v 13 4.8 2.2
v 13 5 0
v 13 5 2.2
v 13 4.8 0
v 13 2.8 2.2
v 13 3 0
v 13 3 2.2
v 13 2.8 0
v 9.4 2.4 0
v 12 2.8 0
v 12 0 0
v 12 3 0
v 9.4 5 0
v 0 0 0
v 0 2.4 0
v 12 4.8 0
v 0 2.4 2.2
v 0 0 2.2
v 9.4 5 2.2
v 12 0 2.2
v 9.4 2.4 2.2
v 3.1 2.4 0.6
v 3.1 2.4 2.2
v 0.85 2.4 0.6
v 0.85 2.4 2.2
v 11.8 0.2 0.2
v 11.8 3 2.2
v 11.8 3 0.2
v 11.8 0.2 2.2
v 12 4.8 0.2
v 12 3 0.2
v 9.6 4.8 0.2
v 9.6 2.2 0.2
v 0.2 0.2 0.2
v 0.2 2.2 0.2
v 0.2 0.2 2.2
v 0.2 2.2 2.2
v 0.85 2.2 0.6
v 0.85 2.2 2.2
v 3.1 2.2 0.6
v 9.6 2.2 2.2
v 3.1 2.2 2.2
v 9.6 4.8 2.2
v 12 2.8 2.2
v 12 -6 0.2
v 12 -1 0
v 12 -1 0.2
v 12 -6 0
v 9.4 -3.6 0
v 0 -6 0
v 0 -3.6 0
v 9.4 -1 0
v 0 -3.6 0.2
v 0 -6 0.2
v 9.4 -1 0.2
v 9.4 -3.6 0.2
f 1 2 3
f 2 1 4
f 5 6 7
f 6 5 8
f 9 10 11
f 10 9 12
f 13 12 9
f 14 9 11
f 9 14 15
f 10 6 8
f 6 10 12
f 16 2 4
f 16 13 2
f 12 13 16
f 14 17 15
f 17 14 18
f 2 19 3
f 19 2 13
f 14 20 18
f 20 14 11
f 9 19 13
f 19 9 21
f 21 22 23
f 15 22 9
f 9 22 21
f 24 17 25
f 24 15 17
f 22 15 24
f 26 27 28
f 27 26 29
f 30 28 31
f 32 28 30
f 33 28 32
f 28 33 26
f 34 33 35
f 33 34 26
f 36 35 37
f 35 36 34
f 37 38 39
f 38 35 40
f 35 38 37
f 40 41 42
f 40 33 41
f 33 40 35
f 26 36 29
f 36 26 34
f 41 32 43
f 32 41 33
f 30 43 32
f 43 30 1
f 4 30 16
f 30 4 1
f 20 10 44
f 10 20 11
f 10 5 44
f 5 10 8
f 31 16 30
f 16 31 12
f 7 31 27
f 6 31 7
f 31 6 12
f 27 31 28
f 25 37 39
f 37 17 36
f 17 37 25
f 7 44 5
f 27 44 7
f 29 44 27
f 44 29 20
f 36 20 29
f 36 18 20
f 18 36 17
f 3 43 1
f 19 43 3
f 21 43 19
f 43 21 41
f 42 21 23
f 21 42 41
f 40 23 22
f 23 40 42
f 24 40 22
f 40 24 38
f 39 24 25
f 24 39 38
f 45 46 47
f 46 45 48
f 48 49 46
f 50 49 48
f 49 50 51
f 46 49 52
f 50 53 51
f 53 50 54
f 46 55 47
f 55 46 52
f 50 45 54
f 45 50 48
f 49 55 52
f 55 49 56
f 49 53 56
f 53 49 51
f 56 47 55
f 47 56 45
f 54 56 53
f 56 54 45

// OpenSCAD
difference() {
	
	cube([13, 5, 2.4]);
	
	translate([-0.1, 2.4, -0.5]) {
				cube([9.5, 5, 3]);
		}
		
	translate([0.2, 0.2, 0.2]) {
				cube([11.6, 2.0, 3]);
		}
		
	translate([9.6, 2.1, 0.2]) {
				cube([2.2, 2.7, 3]);
		}
		
	translate([12.0, -0.1, -0.1]) {
				cube([1.1, 2.9, 4]);
		} 

	translate([12, 3, -0.5]) {
				cube([3, 1.8, 4.5]);
		} 

	translate([11.6, 3, 0.2]) {
			cube([3, 1.8, 4.5]);
		}
	
	translate([-0.1, -0.1, 2.2]) {
				cube([14.1, 6, 4.5]);	
	}
	
	translate([0.85, 0.5, 0.6]) {
				cube([2.25, 5.0, 1.7]);	
	}
}

translate([0, -6, 0]) {
	difference() {
		
		cube([12, 5, 2.4]);
		
		translate([-0.1, 2.4, -0.5]) {
					cube([9.5, 5, 3]);
			}
		
		
		translate([-0.1, -0.1, 0.2]) {
					cube([26, 9, 3]);
			}
		
}
	
}
